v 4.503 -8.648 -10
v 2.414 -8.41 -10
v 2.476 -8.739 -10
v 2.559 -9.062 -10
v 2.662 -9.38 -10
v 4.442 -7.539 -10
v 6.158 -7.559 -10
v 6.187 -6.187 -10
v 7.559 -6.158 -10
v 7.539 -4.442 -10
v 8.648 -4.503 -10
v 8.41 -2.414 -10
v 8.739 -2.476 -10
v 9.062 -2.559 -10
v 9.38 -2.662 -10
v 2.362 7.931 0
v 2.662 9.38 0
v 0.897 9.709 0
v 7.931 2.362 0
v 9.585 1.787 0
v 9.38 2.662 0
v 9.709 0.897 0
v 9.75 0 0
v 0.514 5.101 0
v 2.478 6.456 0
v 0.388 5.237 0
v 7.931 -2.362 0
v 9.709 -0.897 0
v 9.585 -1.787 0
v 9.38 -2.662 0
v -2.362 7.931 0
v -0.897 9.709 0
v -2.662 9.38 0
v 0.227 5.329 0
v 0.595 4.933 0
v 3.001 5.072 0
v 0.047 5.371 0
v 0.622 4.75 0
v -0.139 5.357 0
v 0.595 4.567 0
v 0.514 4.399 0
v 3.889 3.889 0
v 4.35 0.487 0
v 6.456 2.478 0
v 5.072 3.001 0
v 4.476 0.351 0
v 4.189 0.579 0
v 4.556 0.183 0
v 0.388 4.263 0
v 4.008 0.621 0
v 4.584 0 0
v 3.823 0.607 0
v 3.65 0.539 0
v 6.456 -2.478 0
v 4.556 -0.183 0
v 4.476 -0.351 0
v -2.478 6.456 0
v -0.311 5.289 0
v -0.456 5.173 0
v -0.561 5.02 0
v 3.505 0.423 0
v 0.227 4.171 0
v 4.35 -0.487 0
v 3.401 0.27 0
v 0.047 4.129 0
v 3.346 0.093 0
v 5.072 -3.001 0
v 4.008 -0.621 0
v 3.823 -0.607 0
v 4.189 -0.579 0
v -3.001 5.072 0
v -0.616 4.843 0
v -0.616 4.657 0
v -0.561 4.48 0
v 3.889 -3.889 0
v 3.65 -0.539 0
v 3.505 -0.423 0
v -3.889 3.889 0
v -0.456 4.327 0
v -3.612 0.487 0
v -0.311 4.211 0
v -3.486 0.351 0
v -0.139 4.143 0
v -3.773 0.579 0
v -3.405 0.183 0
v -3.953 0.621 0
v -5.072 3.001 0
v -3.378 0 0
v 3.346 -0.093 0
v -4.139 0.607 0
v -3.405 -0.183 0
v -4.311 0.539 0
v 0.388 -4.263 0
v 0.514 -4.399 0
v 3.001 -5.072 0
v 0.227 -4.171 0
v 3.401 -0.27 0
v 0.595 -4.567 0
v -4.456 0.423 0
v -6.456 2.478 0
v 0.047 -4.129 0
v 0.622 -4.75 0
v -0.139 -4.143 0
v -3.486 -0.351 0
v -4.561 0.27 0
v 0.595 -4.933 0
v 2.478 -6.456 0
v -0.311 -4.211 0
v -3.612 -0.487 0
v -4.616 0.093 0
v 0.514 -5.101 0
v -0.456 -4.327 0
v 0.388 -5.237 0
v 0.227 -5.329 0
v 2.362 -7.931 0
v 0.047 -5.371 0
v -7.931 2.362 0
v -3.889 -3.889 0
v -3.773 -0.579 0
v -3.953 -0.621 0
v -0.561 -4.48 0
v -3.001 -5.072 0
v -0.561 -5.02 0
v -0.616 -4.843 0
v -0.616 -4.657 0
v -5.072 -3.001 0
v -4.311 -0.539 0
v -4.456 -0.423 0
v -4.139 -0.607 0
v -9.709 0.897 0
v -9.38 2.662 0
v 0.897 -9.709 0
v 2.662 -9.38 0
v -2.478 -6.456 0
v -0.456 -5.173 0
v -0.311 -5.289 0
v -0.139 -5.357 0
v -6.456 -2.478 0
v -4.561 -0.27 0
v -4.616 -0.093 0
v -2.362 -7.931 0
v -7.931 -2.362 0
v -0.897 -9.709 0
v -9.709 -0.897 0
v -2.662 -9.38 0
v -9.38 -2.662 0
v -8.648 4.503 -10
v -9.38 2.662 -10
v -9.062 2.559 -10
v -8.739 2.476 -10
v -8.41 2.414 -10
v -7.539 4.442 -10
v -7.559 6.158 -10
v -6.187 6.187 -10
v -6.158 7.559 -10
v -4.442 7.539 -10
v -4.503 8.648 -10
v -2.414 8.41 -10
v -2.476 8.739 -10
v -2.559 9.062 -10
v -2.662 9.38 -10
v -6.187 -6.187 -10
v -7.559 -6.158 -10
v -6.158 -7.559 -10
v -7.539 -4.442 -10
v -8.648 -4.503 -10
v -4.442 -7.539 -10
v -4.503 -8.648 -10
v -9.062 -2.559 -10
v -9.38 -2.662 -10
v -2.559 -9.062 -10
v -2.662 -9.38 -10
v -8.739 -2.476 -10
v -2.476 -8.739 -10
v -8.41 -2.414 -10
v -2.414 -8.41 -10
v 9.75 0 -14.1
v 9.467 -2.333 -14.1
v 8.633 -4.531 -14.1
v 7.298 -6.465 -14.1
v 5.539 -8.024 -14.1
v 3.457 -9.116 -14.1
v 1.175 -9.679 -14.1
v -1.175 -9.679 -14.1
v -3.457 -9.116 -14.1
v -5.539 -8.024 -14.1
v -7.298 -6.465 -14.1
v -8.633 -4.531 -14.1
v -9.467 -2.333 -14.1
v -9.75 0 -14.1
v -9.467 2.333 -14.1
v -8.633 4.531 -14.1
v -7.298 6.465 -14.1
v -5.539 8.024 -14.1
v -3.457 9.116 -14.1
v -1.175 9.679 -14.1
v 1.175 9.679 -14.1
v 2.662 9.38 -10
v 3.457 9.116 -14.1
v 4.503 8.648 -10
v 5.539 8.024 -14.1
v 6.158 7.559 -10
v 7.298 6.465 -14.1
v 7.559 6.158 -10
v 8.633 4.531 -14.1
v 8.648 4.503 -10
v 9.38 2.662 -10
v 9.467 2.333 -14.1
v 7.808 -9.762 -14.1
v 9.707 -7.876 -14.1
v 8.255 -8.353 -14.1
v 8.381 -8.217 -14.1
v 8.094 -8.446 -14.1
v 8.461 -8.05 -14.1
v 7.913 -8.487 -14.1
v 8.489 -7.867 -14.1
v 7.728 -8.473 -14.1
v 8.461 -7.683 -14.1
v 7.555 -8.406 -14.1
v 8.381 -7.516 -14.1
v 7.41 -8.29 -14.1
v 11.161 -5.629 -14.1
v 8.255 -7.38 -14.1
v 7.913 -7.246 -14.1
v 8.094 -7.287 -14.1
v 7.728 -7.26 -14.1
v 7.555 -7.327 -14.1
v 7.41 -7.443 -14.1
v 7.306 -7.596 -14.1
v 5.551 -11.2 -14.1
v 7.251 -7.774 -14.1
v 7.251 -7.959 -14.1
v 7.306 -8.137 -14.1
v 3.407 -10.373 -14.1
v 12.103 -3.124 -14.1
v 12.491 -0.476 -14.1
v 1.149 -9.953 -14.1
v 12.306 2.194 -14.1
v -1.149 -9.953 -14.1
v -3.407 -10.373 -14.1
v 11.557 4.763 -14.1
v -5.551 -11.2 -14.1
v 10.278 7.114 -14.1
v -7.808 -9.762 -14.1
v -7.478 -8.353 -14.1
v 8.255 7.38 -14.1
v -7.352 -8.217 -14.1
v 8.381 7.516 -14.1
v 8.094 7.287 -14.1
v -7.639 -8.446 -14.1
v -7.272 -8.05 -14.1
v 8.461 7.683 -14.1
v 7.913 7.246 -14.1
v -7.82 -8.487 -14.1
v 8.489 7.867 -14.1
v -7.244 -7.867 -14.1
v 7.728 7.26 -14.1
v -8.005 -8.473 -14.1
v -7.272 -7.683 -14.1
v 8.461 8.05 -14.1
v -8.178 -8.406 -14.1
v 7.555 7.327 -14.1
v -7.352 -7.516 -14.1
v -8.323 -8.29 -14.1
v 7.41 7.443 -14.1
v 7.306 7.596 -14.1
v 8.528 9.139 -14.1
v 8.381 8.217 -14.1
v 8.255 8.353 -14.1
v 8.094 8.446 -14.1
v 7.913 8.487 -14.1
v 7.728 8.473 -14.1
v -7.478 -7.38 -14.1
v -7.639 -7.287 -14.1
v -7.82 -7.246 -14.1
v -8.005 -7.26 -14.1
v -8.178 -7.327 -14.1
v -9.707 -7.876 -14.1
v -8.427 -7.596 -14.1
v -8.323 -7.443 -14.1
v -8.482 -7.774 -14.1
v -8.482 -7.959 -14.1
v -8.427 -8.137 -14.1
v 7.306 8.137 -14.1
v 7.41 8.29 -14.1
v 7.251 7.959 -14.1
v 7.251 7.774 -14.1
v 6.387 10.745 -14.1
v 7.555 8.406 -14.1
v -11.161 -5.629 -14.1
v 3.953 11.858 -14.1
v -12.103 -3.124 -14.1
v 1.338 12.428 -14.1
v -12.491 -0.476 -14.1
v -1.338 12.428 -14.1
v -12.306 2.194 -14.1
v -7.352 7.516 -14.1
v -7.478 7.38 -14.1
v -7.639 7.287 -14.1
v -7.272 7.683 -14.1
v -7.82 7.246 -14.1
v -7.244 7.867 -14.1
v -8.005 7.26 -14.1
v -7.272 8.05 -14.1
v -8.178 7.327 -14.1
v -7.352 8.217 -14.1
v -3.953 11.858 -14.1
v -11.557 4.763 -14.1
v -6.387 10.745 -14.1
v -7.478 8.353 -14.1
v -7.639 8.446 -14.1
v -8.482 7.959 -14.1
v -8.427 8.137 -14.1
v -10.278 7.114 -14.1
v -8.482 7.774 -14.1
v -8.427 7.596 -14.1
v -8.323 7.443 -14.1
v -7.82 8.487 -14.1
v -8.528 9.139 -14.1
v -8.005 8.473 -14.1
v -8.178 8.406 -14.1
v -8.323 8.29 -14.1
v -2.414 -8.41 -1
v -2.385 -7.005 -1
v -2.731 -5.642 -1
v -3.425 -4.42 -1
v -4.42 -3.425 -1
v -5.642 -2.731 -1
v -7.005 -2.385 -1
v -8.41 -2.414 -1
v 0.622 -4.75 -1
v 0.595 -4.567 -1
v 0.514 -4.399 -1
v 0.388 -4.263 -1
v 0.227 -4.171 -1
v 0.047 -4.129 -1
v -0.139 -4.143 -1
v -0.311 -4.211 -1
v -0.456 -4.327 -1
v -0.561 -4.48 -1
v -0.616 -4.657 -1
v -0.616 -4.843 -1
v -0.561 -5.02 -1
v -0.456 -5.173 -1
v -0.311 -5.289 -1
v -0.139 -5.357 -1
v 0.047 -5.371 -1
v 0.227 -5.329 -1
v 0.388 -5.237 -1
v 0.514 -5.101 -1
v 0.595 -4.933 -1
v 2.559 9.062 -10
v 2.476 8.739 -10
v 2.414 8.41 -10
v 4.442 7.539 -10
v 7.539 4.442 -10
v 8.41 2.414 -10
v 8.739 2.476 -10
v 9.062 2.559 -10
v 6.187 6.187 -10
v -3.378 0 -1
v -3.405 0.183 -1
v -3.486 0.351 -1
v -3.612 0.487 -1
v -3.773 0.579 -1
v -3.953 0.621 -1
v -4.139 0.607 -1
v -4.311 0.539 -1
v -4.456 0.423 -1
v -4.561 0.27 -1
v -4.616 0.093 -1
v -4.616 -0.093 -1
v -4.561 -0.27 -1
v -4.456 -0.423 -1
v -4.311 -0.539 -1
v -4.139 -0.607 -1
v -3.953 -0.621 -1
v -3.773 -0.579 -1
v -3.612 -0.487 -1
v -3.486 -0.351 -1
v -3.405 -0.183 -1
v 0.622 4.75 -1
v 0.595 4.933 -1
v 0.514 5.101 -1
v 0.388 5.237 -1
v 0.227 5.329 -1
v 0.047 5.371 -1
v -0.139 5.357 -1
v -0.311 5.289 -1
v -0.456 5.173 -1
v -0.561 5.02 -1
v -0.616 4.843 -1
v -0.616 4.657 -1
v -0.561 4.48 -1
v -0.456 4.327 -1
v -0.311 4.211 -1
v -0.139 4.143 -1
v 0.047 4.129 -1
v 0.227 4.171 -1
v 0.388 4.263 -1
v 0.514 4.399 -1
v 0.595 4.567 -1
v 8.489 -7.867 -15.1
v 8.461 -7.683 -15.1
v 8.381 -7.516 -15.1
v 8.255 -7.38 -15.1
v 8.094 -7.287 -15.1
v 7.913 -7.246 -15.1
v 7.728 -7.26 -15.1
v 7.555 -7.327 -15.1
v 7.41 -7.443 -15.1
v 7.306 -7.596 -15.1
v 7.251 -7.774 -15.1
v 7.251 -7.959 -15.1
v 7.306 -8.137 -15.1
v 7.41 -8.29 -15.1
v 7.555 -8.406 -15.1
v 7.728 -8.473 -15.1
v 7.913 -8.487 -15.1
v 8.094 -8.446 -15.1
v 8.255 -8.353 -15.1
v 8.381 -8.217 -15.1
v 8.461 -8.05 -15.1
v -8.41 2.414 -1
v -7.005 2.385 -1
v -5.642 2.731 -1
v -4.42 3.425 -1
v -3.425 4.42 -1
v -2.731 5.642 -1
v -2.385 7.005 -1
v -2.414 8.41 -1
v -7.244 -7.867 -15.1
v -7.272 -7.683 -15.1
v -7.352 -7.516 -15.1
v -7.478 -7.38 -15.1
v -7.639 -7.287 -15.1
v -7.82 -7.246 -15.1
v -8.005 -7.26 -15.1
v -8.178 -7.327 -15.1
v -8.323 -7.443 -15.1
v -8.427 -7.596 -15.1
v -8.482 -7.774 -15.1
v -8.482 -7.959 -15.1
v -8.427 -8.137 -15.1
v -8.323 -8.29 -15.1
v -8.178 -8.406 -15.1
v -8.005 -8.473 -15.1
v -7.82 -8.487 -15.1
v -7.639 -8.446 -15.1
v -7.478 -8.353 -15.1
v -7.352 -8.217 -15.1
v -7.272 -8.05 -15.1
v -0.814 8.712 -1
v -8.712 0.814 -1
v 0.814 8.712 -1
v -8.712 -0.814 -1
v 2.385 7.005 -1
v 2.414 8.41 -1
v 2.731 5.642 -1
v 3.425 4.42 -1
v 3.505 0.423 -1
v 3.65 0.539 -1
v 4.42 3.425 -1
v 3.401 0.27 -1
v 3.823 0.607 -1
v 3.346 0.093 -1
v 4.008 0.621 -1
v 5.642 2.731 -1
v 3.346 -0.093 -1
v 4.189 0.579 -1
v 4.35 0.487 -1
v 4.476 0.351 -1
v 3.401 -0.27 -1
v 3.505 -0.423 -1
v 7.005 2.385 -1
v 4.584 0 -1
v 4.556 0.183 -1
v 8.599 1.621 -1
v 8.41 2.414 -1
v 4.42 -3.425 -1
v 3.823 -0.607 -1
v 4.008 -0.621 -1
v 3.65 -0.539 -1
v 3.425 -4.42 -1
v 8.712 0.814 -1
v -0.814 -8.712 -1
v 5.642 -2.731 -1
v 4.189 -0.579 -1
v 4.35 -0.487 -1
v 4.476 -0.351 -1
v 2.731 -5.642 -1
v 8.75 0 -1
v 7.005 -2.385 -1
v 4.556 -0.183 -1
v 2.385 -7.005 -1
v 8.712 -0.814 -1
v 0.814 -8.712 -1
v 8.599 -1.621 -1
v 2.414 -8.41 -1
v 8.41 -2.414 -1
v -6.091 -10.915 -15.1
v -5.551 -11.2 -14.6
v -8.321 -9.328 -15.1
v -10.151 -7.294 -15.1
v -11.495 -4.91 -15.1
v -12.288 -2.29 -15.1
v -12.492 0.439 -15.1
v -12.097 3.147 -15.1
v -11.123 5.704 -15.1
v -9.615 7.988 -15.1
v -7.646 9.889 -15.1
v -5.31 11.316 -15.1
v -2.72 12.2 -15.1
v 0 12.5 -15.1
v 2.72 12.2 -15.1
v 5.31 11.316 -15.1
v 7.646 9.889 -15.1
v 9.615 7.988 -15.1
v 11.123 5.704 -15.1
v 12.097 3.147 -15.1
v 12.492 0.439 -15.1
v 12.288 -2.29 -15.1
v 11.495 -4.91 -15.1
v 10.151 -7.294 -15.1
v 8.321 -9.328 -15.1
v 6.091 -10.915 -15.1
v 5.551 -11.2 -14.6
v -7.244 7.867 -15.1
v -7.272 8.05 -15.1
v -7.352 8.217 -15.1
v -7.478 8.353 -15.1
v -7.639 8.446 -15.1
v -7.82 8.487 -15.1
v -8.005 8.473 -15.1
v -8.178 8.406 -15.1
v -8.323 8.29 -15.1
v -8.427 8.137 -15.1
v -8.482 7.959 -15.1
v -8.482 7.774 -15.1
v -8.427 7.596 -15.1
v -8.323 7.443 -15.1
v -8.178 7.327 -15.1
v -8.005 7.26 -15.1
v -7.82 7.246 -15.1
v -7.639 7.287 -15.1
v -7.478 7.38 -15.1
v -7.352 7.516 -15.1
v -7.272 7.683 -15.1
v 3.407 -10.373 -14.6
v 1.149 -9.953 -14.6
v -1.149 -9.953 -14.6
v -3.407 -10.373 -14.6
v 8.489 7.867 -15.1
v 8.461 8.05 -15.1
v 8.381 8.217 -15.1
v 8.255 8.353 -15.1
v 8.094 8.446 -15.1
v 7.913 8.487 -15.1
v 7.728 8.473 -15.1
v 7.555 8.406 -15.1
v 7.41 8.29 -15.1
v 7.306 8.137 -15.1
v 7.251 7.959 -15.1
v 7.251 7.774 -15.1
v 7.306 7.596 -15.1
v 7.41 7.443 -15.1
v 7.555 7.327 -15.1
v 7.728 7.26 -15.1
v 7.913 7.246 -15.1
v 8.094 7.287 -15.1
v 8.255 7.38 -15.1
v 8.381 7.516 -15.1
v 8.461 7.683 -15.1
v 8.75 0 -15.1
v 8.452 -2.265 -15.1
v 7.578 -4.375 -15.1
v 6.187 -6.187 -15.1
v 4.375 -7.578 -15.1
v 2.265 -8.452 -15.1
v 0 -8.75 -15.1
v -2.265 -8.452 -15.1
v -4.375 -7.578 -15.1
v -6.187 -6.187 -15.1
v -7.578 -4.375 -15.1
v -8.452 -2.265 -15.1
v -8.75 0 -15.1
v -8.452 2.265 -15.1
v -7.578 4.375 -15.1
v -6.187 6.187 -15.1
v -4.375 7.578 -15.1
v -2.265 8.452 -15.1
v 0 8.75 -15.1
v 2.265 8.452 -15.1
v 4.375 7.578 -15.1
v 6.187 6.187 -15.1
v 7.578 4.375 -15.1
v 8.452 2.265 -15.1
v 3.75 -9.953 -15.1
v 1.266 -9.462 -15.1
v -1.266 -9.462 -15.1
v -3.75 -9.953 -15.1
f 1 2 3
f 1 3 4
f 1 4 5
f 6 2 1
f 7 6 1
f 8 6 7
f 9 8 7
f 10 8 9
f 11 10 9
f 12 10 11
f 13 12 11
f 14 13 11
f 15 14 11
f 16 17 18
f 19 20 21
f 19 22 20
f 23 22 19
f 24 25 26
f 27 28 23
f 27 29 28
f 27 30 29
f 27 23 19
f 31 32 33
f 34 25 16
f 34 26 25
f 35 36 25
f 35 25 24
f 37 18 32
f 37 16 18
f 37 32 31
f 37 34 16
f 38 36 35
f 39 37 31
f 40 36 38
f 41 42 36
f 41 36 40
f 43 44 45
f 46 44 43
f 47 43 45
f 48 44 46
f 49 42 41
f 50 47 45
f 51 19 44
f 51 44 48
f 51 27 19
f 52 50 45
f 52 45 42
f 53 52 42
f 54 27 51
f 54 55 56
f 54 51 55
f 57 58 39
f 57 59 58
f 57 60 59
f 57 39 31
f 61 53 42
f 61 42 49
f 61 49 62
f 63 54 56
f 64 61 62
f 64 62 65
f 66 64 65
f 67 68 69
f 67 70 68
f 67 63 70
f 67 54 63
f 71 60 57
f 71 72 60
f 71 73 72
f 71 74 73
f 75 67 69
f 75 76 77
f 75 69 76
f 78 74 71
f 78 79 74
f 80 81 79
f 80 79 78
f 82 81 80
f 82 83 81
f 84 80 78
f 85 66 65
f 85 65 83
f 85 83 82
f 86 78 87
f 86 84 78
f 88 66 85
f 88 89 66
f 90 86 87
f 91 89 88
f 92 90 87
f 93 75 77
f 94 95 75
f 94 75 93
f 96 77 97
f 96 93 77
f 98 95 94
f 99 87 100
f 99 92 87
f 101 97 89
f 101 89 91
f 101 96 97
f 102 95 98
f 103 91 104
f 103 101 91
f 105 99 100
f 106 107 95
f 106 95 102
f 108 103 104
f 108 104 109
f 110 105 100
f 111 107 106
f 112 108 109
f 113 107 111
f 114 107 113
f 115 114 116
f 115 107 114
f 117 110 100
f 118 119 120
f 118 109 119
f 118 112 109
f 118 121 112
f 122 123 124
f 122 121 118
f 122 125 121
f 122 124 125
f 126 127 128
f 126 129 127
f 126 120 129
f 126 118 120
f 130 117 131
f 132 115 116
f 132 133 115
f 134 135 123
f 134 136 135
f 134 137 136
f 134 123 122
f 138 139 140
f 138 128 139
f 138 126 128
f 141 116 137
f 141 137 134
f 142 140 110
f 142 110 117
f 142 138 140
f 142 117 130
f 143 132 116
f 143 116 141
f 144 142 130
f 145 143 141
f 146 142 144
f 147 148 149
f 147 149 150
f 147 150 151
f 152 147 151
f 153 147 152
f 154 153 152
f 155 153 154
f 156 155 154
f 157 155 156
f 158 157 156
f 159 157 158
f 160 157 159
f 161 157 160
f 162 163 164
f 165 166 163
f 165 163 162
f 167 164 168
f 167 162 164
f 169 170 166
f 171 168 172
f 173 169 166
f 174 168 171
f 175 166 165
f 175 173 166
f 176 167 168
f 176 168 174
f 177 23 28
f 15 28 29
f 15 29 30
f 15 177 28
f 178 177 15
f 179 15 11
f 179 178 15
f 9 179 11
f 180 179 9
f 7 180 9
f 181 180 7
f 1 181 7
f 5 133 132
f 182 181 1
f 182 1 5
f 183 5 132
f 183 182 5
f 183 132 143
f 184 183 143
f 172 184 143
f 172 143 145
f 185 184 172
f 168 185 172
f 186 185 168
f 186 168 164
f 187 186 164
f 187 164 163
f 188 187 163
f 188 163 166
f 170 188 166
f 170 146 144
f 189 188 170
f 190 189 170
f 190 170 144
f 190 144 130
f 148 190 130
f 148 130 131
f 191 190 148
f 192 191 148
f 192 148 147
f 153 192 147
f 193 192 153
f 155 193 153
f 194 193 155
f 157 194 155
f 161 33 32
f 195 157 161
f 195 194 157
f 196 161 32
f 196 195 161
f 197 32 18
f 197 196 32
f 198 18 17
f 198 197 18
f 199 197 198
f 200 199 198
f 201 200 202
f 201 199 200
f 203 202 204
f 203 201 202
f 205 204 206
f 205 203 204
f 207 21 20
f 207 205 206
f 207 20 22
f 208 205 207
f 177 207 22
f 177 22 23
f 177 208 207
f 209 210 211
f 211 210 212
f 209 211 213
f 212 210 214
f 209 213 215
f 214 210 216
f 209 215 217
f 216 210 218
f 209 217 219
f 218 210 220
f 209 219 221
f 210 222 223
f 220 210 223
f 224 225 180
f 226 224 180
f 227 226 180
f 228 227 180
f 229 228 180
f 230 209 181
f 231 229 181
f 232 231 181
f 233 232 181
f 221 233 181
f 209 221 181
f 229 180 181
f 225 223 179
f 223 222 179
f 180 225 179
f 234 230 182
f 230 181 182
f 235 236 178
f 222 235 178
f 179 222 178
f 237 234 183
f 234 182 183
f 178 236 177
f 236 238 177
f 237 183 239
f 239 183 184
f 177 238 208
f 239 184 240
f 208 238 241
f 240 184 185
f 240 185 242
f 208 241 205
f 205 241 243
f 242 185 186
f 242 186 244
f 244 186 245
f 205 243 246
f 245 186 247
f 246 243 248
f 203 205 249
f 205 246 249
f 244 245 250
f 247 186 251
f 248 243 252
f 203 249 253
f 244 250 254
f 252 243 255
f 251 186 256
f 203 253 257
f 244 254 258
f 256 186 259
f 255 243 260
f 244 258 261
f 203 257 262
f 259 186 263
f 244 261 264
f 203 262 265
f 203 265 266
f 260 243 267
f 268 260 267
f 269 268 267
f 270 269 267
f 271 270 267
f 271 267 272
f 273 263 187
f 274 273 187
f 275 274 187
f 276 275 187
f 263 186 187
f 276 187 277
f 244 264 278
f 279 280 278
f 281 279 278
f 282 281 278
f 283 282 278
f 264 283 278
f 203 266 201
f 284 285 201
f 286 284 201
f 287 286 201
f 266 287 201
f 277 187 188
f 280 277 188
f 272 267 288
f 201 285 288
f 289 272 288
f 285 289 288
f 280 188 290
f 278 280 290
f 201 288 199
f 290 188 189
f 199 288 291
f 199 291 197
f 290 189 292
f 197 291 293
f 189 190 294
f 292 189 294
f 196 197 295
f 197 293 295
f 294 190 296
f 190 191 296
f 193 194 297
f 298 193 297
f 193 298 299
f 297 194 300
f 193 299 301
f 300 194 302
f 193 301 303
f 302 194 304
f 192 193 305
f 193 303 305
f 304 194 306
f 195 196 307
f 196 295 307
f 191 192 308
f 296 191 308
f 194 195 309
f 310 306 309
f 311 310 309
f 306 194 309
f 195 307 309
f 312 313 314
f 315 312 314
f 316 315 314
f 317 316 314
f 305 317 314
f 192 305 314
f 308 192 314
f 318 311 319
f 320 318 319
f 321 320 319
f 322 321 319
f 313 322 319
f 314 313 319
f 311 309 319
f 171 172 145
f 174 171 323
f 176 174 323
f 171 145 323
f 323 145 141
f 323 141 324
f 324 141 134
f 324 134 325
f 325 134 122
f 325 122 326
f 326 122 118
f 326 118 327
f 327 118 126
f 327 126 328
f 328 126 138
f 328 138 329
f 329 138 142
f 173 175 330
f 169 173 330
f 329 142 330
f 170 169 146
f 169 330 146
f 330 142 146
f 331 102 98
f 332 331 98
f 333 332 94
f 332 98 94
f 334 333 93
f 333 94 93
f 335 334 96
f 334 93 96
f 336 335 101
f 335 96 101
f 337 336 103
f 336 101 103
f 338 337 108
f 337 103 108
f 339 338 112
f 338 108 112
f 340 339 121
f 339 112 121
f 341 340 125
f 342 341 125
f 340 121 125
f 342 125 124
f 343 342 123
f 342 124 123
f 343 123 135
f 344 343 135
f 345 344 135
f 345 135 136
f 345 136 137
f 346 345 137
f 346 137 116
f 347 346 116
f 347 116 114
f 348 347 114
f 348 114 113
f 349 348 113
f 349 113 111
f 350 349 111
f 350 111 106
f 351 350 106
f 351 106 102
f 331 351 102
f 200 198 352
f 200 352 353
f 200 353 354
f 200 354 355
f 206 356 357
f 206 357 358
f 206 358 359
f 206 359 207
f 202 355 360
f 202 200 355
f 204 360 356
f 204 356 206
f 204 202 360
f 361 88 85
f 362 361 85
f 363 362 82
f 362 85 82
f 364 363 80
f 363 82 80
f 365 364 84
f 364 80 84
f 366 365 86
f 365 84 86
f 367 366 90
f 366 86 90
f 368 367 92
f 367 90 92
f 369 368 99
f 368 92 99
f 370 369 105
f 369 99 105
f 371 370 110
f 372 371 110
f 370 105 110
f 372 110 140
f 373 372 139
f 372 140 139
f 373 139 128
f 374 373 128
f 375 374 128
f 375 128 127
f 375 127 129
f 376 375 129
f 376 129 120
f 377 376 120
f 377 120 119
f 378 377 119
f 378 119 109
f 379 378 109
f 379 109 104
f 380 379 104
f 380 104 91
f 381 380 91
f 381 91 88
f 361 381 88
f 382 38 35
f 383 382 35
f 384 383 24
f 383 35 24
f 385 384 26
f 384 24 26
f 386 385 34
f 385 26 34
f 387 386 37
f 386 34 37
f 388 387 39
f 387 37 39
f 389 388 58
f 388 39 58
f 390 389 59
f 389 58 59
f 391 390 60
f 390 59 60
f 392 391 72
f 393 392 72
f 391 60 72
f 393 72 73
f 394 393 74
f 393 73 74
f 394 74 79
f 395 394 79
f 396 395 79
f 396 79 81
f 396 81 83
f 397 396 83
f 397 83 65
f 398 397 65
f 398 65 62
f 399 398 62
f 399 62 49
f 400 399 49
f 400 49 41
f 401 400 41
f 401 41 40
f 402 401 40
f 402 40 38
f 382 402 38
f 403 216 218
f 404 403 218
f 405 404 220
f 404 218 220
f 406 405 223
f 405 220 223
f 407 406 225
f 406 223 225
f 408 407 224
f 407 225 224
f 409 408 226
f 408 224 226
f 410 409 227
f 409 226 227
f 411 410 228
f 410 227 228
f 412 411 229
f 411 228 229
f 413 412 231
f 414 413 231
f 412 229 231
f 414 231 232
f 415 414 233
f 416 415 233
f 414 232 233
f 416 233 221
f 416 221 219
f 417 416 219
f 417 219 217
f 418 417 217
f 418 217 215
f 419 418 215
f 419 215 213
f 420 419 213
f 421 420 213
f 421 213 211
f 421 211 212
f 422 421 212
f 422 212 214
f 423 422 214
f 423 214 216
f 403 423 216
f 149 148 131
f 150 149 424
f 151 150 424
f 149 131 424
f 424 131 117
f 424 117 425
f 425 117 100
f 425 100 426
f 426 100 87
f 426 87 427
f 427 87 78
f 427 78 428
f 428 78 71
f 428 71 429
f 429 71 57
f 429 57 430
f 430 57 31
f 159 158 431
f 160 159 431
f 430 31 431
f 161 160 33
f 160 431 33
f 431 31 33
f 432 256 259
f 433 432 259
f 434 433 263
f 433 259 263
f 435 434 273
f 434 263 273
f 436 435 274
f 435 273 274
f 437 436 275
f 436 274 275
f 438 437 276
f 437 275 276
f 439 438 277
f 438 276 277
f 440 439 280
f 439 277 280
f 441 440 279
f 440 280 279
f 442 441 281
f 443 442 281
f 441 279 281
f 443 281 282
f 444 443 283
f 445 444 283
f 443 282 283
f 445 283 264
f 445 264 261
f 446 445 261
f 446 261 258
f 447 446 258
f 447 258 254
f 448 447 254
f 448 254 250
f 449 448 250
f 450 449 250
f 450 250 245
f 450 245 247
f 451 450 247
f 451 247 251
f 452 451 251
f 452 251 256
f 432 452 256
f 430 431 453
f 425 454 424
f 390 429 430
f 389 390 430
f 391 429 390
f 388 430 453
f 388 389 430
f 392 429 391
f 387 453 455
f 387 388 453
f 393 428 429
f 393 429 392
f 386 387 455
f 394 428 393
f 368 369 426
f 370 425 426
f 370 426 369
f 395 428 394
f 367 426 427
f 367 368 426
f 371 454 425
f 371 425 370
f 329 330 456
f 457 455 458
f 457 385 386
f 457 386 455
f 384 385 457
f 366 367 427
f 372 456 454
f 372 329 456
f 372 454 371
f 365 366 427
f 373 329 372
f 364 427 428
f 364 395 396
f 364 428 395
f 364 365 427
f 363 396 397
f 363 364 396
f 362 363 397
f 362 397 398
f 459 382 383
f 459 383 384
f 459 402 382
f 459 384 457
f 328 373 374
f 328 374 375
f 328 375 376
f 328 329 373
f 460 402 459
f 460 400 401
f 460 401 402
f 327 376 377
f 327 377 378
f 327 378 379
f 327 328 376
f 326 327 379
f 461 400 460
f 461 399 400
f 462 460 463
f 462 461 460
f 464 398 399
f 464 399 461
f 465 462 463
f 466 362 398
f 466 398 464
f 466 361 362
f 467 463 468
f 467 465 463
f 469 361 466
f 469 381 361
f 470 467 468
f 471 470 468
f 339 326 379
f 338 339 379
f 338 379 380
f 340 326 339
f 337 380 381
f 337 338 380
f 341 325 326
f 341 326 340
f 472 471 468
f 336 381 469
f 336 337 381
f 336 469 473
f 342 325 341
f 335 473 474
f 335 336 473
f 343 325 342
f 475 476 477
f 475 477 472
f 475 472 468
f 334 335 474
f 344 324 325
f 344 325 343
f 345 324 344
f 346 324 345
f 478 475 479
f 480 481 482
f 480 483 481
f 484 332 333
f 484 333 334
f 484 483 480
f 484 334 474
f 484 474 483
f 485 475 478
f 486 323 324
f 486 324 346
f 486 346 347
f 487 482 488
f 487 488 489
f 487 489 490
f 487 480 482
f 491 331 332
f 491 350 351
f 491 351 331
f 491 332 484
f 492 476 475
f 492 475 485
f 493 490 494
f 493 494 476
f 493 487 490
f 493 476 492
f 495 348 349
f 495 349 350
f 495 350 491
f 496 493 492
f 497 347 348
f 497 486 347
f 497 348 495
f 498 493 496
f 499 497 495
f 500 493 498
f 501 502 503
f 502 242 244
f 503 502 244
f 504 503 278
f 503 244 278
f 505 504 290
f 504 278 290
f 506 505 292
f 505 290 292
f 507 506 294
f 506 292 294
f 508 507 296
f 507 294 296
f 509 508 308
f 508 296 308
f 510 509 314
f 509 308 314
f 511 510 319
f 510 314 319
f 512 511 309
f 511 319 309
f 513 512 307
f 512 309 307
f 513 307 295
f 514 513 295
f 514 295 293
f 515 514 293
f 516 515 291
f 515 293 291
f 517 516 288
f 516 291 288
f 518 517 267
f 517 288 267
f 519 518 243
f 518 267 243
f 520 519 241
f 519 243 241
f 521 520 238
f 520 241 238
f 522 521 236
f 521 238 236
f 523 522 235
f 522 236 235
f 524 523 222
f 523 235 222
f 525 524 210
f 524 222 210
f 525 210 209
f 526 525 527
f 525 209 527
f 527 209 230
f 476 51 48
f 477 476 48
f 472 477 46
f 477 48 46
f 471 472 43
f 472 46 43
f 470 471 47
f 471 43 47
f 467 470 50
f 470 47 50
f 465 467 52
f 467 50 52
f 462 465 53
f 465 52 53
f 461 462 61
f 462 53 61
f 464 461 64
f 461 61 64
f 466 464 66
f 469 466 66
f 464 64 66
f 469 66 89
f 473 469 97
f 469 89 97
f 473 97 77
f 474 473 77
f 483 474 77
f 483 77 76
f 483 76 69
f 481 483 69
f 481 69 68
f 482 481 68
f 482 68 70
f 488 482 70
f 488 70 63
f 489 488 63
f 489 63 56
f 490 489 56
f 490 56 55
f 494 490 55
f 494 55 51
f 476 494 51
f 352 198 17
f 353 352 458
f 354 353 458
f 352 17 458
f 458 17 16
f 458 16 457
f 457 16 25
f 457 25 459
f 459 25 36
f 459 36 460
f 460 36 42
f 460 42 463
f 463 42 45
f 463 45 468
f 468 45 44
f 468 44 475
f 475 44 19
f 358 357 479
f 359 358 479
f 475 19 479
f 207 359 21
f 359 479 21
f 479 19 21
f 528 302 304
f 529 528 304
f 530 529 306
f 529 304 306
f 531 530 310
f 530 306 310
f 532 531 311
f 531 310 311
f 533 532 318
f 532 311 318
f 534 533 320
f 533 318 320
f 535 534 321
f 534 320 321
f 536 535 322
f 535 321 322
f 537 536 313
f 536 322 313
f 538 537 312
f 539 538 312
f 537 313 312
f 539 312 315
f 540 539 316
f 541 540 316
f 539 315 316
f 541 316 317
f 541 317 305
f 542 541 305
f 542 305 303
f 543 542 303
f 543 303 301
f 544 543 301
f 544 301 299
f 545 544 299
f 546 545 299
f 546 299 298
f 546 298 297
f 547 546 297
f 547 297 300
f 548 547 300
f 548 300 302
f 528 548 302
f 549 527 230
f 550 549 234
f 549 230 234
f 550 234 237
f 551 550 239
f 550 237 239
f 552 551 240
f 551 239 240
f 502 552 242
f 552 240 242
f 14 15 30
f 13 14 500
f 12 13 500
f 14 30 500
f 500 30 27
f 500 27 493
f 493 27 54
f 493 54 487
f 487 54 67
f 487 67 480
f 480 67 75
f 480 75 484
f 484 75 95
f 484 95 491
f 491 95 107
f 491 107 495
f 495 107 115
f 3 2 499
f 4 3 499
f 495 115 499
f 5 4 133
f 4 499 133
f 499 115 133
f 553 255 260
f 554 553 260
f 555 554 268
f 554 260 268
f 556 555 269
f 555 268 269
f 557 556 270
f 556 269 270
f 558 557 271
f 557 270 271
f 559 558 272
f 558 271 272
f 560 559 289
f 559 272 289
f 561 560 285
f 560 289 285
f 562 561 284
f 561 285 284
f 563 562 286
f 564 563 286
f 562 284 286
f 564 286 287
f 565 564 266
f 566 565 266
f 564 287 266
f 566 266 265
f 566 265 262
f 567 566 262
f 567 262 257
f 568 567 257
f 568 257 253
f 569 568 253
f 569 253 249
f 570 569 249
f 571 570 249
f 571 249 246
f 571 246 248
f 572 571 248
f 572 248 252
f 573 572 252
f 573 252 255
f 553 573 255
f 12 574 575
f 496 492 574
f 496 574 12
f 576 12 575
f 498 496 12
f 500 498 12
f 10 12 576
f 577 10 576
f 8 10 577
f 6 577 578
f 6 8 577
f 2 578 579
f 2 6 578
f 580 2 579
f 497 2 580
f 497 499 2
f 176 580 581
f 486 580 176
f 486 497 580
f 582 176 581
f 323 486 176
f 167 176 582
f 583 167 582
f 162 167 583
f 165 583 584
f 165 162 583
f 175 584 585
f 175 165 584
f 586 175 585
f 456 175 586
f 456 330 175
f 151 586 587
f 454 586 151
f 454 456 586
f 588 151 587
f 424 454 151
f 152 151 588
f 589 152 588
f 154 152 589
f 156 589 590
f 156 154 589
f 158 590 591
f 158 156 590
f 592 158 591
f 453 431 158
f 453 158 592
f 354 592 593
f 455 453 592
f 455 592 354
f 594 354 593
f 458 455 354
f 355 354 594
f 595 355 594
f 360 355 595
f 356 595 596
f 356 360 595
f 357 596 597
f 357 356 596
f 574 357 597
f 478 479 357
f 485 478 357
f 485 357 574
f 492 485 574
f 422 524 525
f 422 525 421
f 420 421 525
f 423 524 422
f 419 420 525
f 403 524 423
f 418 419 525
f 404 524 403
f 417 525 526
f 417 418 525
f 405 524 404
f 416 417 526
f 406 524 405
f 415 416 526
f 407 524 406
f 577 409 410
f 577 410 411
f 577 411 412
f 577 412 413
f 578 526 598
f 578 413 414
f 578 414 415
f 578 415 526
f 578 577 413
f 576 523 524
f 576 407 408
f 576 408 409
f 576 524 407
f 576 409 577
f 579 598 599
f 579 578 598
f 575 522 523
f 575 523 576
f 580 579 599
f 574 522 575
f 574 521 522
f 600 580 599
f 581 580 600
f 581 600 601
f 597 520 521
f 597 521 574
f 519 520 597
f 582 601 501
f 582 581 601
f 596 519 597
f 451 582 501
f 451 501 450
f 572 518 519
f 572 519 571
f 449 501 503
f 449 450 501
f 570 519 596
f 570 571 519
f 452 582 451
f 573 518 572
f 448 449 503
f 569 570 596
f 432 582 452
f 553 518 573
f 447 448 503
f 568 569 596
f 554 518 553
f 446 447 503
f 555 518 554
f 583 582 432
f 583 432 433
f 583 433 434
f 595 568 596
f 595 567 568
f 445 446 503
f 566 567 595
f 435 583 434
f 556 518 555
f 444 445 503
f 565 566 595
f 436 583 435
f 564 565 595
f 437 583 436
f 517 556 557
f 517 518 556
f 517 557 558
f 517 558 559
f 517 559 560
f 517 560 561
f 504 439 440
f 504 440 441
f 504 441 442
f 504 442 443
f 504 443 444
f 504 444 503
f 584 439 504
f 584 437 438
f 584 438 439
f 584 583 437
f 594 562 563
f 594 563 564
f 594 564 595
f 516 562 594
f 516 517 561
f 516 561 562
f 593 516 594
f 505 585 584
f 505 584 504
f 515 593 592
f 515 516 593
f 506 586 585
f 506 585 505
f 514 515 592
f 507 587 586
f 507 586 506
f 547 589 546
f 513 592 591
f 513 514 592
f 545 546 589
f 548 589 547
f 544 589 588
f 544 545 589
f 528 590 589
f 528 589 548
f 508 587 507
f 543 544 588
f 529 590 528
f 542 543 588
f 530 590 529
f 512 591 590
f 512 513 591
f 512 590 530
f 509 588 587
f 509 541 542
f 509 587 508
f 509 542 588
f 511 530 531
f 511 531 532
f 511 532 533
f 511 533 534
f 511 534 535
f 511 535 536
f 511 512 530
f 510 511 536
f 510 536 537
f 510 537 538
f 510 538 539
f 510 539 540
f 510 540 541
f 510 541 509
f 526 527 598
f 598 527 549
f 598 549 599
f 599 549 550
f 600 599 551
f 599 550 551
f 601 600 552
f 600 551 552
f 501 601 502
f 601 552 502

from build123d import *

# Parameters (mm, degrees)
SKETCH_3_R             = 0.6225
SKETCH_3_R_2           = 5.25
CUT_EXTRUDE_1_DEPTH    = 10
EXTRUDE_START          = -1
SKETCH_4_R             = 12.5
SKETCH_4_R_2           = 8.75
EXTRUDE_1_DEPTH        = 1
SKETCH_9_R             = 0.6225
CUT_EXTRUDE_2_DEPTH    = 23.612164868
SKETCH_10_R            = 12.5
CUT_EXTRUDE_1339_DEPTH = 23.612164868
CHAMFER_1434_SIZE      = 0.5


with BuildPart() as part:
    # Эскиз1 → Повернуть1 (revolve)
    with BuildSketch(Plane(origin=(0, 0, 0), x_dir=(1, 0, 0), z_dir=(0, 1, 0))):
        Polygon((8.75, 1), (0, 1), (0, 0), (9.75, 0), (9.75, 15.1), (8.75, 15.1), align=None)
    revolve(axis=Axis((0, 0, 0), (0, 0, -1)))

    # Эскиз3 → Вырез-Вытянуть1 (cut)
    with BuildSketch(Plane.XY):
        with Locations((-4, 0)):
            Circle(SKETCH_3_R)
        with Locations((0, -4.75)):
            Circle(SKETCH_3_R)
        with Locations((3.96157844, 0)):
            Circle(SKETCH_3_R)
        with Locations((0, 4.75)):
            Circle(SKETCH_3_R)
        with Locations((7.601397898, -7.601397898)):
            Circle(SKETCH_3_R_2)
        with Locations((-7.601397898, -7.601397898)):
            Circle(SKETCH_3_R_2)
        with Locations((-7.601397898, 7.601397898)):
            Circle(SKETCH_3_R_2)
        with Locations((7.601397898, 7.601397898)):
            Circle(SKETCH_3_R_2)
    extrude(amount=-CUT_EXTRUDE_1_DEPTH, mode=Mode.SUBTRACT)

    # Эскиз4 → Бобышка-Вытянуть1 (add)
    with BuildSketch(Plane(origin=(0, 0, -15.1), x_dir=(-1, 0, 0), z_dir=(0, 0, -1)).offset(EXTRUDE_START)):
        Circle(SKETCH_4_R)
        with Locations(Location((0, 0, 0), (0, 0, 180))):
            Circle(SKETCH_4_R_2, mode=Mode.SUBTRACT)
    extrude(amount=EXTRUDE_1_DEPTH)

    # Эскиз9 → Вырез-Вытянуть2 (cut, through all)
    with BuildSketch(Plane.XY.offset(-14.1)):
        with Locations((7.866562941, 7.866562941)):
            Circle(SKETCH_9_R)
        with Locations((7.866562941, -7.866562941)):
            Circle(SKETCH_9_R)
        with Locations((-7.866562941, -7.866562941)):
            Circle(SKETCH_9_R)
        with Locations((-7.866562941, 7.866562941)):
            Circle(SKETCH_9_R)
    extrude(amount=-CUT_EXTRUDE_2_DEPTH, mode=Mode.SUBTRACT)

    # Эскиз10 → Cut-Extrude 1339 (cut, through all)
    with BuildSketch(Plane.XY.offset(-14.1)):
        with Locations((0, -22.4)):
            Circle(SKETCH_10_R)
    extrude(amount=-CUT_EXTRUDE_1339_DEPTH, mode=Mode.SUBTRACT)

    # Chamfer 1434
    chamfer_1434_edges = [part.edges().sort_by_distance(p)[0] for p in [
        (0, -9.9, -15.1),
    ]]
    chamfer(chamfer_1434_edges, length=CHAMFER_1434_SIZE)


solid = part.part
